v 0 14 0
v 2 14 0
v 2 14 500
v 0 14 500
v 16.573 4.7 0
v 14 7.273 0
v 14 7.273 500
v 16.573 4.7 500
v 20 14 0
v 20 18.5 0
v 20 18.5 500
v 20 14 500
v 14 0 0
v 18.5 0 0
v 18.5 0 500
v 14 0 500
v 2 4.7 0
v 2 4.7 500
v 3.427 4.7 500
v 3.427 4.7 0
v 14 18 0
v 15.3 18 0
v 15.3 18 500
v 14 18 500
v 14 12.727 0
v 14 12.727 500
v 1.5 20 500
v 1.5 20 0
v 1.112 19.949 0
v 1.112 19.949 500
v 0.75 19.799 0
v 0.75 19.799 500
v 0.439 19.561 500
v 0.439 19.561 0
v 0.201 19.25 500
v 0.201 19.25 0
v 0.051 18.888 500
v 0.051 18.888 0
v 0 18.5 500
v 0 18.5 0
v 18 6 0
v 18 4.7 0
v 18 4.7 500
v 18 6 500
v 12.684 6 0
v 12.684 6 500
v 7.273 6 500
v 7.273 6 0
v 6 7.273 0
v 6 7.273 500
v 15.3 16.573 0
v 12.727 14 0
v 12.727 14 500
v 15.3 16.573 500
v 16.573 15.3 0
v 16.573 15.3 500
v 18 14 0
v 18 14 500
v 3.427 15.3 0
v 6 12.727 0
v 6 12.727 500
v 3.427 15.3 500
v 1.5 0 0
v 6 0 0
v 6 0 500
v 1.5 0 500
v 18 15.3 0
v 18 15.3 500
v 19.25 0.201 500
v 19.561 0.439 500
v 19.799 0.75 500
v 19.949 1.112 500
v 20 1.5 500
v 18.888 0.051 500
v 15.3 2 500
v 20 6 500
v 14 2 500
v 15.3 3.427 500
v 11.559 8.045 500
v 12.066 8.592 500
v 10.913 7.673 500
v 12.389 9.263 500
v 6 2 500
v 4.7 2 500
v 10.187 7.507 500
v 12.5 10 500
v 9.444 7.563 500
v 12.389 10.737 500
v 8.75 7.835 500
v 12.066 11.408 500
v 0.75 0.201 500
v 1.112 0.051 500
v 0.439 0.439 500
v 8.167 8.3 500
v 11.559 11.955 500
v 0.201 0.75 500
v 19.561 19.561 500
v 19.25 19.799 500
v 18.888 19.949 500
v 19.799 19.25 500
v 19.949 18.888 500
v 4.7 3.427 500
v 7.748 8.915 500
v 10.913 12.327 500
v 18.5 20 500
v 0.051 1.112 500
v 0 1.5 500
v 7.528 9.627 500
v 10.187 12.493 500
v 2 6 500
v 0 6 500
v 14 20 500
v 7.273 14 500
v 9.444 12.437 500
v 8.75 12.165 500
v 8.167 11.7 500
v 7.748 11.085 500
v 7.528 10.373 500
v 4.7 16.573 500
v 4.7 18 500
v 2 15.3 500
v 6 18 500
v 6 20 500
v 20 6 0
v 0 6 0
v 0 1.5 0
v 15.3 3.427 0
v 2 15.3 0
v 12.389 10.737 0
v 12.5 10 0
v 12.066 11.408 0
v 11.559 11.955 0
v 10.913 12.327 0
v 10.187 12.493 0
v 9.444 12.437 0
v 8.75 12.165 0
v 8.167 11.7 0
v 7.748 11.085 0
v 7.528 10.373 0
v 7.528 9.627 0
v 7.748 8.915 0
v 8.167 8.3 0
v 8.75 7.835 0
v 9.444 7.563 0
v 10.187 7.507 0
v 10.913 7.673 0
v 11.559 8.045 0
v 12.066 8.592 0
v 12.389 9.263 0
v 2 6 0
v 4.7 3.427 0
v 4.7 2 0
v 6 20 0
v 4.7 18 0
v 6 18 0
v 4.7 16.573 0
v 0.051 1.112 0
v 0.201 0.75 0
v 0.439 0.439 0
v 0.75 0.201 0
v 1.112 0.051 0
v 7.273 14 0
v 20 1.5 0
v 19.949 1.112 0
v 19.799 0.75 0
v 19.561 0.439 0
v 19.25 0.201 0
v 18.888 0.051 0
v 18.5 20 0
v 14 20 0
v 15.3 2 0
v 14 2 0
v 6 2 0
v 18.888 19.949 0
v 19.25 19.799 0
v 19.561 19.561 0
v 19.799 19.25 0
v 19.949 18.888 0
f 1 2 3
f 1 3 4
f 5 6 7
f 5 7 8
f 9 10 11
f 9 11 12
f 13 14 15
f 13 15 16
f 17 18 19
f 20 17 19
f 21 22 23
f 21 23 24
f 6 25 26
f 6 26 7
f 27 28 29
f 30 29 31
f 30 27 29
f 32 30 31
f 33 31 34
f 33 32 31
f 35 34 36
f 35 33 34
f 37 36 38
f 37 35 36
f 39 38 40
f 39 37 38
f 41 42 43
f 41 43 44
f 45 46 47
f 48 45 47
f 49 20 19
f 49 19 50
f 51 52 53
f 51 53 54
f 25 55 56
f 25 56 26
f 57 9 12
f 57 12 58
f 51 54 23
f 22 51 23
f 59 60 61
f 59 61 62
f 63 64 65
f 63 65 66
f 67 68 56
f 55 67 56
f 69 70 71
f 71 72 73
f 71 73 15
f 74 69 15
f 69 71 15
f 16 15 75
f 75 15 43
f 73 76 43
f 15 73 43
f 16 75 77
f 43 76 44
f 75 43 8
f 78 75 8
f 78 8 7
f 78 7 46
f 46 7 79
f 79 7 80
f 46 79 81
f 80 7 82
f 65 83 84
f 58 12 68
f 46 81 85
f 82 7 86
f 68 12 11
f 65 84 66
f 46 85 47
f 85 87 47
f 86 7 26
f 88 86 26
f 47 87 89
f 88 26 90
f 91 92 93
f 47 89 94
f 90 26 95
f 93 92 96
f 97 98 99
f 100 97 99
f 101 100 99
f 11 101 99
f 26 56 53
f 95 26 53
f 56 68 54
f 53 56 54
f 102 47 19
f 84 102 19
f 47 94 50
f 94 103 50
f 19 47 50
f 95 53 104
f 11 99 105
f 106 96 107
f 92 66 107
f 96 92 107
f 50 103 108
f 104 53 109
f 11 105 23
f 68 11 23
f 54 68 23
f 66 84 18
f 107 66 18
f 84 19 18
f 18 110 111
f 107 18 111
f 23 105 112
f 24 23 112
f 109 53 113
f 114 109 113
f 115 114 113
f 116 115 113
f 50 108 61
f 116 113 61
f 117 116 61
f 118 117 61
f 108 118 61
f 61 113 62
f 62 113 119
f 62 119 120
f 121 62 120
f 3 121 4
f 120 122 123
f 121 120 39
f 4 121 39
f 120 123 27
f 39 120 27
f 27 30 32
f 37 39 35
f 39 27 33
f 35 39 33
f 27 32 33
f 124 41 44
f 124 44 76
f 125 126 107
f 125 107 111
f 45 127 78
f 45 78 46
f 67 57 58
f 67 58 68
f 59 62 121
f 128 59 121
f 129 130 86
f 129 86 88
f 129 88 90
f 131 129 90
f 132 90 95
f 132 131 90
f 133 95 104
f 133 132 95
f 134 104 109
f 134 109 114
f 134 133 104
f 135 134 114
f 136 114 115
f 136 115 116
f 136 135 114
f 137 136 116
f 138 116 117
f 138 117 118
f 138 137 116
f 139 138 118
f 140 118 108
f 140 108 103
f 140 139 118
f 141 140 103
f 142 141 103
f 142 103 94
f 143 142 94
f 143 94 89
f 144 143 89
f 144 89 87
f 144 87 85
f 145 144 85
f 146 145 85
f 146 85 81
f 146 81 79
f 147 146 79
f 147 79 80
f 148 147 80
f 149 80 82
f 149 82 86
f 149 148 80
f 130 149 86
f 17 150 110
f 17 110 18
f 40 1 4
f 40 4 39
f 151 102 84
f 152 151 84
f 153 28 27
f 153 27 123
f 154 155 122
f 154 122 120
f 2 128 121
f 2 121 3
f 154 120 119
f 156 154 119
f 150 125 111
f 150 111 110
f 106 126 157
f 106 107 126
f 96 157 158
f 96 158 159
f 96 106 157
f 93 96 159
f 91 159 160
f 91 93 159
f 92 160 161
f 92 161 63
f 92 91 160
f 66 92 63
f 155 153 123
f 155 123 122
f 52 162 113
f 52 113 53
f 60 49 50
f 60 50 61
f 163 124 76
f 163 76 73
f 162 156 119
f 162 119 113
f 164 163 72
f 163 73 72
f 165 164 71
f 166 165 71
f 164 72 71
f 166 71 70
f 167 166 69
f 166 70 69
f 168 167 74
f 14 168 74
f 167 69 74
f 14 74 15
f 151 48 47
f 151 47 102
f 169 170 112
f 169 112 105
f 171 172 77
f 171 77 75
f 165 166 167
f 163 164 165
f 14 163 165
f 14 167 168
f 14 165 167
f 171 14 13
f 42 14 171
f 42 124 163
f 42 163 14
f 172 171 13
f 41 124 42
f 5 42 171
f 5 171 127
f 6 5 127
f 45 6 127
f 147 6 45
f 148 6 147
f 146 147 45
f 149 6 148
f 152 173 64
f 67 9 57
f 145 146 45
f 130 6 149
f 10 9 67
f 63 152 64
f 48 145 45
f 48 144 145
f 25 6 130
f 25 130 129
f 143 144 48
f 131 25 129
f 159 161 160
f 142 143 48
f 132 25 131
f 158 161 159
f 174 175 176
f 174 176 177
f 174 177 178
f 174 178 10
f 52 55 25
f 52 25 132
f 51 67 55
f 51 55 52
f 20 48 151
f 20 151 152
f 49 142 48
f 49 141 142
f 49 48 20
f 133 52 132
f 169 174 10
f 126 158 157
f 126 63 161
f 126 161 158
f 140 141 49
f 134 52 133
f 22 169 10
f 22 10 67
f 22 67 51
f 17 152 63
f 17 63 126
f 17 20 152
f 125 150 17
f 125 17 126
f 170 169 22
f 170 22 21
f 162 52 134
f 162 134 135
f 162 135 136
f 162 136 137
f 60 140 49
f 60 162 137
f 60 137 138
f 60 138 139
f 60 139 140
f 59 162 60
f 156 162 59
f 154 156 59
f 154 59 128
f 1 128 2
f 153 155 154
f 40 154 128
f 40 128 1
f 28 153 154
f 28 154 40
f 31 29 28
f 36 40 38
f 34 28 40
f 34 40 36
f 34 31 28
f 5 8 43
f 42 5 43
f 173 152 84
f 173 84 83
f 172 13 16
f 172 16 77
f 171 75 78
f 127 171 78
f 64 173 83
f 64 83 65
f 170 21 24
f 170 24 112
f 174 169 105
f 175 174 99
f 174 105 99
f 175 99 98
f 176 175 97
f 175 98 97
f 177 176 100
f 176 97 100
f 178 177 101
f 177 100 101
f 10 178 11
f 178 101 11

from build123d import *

# Parameters (mm, degrees)
SKETCH_1_R      = 2.5
EXTRUDE_1_DEPTH = 500
FILLET_1_R      = 1.5


with BuildPart() as part:
    # Эскиз1 → Бобышка-Вытянуть1 (new body)
    with BuildSketch(Plane.XY):
        Polygon((14, 20), (20, 20), (20, 14), (18, 14), (18, 15.3), (16.572792206, 15.3), (14, 12.727207794), (14, 7.272792206), (16.572792206, 4.7), (18, 4.7), (18, 6), (20, 6), (20, 0), (14, 0), (14, 2), (15.3, 2), (15.3, 3.427207794), (12.684044775, 6), (7.272792206, 6), (4.7, 3.427207794), (4.7, 2), (6, 2), (6, 0), (0, 0), (0, 6), (2, 6), (2, 4.7), (3.427207794, 4.7), (6, 7.272792206), (6, 12.727207794), (3.427207794, 15.3), (2, 15.3), (2, 14), (0, 14), (0, 20), (6, 20), (6, 18), (4.7, 18), (4.7, 16.572792206), (7.272792206, 14), (12.727207794, 14), (15.3, 16.572792206), (15.3, 18), (14, 18), align=None)
        with Locations((10, 10)):
            Circle(SKETCH_1_R, mode=Mode.SUBTRACT)
    extrude(amount=EXTRUDE_1_DEPTH)

    # Скругление1
    fillet_1_edges = [part.edges().sort_by_distance(p)[0] for p in [
        (0, 20, 250),
        (20, 20, 250),
        (20, 0, 250),
        (0, 0, 250),
    ]]
    fillet(fillet_1_edges, radius=FILLET_1_R)


solid = part.part
